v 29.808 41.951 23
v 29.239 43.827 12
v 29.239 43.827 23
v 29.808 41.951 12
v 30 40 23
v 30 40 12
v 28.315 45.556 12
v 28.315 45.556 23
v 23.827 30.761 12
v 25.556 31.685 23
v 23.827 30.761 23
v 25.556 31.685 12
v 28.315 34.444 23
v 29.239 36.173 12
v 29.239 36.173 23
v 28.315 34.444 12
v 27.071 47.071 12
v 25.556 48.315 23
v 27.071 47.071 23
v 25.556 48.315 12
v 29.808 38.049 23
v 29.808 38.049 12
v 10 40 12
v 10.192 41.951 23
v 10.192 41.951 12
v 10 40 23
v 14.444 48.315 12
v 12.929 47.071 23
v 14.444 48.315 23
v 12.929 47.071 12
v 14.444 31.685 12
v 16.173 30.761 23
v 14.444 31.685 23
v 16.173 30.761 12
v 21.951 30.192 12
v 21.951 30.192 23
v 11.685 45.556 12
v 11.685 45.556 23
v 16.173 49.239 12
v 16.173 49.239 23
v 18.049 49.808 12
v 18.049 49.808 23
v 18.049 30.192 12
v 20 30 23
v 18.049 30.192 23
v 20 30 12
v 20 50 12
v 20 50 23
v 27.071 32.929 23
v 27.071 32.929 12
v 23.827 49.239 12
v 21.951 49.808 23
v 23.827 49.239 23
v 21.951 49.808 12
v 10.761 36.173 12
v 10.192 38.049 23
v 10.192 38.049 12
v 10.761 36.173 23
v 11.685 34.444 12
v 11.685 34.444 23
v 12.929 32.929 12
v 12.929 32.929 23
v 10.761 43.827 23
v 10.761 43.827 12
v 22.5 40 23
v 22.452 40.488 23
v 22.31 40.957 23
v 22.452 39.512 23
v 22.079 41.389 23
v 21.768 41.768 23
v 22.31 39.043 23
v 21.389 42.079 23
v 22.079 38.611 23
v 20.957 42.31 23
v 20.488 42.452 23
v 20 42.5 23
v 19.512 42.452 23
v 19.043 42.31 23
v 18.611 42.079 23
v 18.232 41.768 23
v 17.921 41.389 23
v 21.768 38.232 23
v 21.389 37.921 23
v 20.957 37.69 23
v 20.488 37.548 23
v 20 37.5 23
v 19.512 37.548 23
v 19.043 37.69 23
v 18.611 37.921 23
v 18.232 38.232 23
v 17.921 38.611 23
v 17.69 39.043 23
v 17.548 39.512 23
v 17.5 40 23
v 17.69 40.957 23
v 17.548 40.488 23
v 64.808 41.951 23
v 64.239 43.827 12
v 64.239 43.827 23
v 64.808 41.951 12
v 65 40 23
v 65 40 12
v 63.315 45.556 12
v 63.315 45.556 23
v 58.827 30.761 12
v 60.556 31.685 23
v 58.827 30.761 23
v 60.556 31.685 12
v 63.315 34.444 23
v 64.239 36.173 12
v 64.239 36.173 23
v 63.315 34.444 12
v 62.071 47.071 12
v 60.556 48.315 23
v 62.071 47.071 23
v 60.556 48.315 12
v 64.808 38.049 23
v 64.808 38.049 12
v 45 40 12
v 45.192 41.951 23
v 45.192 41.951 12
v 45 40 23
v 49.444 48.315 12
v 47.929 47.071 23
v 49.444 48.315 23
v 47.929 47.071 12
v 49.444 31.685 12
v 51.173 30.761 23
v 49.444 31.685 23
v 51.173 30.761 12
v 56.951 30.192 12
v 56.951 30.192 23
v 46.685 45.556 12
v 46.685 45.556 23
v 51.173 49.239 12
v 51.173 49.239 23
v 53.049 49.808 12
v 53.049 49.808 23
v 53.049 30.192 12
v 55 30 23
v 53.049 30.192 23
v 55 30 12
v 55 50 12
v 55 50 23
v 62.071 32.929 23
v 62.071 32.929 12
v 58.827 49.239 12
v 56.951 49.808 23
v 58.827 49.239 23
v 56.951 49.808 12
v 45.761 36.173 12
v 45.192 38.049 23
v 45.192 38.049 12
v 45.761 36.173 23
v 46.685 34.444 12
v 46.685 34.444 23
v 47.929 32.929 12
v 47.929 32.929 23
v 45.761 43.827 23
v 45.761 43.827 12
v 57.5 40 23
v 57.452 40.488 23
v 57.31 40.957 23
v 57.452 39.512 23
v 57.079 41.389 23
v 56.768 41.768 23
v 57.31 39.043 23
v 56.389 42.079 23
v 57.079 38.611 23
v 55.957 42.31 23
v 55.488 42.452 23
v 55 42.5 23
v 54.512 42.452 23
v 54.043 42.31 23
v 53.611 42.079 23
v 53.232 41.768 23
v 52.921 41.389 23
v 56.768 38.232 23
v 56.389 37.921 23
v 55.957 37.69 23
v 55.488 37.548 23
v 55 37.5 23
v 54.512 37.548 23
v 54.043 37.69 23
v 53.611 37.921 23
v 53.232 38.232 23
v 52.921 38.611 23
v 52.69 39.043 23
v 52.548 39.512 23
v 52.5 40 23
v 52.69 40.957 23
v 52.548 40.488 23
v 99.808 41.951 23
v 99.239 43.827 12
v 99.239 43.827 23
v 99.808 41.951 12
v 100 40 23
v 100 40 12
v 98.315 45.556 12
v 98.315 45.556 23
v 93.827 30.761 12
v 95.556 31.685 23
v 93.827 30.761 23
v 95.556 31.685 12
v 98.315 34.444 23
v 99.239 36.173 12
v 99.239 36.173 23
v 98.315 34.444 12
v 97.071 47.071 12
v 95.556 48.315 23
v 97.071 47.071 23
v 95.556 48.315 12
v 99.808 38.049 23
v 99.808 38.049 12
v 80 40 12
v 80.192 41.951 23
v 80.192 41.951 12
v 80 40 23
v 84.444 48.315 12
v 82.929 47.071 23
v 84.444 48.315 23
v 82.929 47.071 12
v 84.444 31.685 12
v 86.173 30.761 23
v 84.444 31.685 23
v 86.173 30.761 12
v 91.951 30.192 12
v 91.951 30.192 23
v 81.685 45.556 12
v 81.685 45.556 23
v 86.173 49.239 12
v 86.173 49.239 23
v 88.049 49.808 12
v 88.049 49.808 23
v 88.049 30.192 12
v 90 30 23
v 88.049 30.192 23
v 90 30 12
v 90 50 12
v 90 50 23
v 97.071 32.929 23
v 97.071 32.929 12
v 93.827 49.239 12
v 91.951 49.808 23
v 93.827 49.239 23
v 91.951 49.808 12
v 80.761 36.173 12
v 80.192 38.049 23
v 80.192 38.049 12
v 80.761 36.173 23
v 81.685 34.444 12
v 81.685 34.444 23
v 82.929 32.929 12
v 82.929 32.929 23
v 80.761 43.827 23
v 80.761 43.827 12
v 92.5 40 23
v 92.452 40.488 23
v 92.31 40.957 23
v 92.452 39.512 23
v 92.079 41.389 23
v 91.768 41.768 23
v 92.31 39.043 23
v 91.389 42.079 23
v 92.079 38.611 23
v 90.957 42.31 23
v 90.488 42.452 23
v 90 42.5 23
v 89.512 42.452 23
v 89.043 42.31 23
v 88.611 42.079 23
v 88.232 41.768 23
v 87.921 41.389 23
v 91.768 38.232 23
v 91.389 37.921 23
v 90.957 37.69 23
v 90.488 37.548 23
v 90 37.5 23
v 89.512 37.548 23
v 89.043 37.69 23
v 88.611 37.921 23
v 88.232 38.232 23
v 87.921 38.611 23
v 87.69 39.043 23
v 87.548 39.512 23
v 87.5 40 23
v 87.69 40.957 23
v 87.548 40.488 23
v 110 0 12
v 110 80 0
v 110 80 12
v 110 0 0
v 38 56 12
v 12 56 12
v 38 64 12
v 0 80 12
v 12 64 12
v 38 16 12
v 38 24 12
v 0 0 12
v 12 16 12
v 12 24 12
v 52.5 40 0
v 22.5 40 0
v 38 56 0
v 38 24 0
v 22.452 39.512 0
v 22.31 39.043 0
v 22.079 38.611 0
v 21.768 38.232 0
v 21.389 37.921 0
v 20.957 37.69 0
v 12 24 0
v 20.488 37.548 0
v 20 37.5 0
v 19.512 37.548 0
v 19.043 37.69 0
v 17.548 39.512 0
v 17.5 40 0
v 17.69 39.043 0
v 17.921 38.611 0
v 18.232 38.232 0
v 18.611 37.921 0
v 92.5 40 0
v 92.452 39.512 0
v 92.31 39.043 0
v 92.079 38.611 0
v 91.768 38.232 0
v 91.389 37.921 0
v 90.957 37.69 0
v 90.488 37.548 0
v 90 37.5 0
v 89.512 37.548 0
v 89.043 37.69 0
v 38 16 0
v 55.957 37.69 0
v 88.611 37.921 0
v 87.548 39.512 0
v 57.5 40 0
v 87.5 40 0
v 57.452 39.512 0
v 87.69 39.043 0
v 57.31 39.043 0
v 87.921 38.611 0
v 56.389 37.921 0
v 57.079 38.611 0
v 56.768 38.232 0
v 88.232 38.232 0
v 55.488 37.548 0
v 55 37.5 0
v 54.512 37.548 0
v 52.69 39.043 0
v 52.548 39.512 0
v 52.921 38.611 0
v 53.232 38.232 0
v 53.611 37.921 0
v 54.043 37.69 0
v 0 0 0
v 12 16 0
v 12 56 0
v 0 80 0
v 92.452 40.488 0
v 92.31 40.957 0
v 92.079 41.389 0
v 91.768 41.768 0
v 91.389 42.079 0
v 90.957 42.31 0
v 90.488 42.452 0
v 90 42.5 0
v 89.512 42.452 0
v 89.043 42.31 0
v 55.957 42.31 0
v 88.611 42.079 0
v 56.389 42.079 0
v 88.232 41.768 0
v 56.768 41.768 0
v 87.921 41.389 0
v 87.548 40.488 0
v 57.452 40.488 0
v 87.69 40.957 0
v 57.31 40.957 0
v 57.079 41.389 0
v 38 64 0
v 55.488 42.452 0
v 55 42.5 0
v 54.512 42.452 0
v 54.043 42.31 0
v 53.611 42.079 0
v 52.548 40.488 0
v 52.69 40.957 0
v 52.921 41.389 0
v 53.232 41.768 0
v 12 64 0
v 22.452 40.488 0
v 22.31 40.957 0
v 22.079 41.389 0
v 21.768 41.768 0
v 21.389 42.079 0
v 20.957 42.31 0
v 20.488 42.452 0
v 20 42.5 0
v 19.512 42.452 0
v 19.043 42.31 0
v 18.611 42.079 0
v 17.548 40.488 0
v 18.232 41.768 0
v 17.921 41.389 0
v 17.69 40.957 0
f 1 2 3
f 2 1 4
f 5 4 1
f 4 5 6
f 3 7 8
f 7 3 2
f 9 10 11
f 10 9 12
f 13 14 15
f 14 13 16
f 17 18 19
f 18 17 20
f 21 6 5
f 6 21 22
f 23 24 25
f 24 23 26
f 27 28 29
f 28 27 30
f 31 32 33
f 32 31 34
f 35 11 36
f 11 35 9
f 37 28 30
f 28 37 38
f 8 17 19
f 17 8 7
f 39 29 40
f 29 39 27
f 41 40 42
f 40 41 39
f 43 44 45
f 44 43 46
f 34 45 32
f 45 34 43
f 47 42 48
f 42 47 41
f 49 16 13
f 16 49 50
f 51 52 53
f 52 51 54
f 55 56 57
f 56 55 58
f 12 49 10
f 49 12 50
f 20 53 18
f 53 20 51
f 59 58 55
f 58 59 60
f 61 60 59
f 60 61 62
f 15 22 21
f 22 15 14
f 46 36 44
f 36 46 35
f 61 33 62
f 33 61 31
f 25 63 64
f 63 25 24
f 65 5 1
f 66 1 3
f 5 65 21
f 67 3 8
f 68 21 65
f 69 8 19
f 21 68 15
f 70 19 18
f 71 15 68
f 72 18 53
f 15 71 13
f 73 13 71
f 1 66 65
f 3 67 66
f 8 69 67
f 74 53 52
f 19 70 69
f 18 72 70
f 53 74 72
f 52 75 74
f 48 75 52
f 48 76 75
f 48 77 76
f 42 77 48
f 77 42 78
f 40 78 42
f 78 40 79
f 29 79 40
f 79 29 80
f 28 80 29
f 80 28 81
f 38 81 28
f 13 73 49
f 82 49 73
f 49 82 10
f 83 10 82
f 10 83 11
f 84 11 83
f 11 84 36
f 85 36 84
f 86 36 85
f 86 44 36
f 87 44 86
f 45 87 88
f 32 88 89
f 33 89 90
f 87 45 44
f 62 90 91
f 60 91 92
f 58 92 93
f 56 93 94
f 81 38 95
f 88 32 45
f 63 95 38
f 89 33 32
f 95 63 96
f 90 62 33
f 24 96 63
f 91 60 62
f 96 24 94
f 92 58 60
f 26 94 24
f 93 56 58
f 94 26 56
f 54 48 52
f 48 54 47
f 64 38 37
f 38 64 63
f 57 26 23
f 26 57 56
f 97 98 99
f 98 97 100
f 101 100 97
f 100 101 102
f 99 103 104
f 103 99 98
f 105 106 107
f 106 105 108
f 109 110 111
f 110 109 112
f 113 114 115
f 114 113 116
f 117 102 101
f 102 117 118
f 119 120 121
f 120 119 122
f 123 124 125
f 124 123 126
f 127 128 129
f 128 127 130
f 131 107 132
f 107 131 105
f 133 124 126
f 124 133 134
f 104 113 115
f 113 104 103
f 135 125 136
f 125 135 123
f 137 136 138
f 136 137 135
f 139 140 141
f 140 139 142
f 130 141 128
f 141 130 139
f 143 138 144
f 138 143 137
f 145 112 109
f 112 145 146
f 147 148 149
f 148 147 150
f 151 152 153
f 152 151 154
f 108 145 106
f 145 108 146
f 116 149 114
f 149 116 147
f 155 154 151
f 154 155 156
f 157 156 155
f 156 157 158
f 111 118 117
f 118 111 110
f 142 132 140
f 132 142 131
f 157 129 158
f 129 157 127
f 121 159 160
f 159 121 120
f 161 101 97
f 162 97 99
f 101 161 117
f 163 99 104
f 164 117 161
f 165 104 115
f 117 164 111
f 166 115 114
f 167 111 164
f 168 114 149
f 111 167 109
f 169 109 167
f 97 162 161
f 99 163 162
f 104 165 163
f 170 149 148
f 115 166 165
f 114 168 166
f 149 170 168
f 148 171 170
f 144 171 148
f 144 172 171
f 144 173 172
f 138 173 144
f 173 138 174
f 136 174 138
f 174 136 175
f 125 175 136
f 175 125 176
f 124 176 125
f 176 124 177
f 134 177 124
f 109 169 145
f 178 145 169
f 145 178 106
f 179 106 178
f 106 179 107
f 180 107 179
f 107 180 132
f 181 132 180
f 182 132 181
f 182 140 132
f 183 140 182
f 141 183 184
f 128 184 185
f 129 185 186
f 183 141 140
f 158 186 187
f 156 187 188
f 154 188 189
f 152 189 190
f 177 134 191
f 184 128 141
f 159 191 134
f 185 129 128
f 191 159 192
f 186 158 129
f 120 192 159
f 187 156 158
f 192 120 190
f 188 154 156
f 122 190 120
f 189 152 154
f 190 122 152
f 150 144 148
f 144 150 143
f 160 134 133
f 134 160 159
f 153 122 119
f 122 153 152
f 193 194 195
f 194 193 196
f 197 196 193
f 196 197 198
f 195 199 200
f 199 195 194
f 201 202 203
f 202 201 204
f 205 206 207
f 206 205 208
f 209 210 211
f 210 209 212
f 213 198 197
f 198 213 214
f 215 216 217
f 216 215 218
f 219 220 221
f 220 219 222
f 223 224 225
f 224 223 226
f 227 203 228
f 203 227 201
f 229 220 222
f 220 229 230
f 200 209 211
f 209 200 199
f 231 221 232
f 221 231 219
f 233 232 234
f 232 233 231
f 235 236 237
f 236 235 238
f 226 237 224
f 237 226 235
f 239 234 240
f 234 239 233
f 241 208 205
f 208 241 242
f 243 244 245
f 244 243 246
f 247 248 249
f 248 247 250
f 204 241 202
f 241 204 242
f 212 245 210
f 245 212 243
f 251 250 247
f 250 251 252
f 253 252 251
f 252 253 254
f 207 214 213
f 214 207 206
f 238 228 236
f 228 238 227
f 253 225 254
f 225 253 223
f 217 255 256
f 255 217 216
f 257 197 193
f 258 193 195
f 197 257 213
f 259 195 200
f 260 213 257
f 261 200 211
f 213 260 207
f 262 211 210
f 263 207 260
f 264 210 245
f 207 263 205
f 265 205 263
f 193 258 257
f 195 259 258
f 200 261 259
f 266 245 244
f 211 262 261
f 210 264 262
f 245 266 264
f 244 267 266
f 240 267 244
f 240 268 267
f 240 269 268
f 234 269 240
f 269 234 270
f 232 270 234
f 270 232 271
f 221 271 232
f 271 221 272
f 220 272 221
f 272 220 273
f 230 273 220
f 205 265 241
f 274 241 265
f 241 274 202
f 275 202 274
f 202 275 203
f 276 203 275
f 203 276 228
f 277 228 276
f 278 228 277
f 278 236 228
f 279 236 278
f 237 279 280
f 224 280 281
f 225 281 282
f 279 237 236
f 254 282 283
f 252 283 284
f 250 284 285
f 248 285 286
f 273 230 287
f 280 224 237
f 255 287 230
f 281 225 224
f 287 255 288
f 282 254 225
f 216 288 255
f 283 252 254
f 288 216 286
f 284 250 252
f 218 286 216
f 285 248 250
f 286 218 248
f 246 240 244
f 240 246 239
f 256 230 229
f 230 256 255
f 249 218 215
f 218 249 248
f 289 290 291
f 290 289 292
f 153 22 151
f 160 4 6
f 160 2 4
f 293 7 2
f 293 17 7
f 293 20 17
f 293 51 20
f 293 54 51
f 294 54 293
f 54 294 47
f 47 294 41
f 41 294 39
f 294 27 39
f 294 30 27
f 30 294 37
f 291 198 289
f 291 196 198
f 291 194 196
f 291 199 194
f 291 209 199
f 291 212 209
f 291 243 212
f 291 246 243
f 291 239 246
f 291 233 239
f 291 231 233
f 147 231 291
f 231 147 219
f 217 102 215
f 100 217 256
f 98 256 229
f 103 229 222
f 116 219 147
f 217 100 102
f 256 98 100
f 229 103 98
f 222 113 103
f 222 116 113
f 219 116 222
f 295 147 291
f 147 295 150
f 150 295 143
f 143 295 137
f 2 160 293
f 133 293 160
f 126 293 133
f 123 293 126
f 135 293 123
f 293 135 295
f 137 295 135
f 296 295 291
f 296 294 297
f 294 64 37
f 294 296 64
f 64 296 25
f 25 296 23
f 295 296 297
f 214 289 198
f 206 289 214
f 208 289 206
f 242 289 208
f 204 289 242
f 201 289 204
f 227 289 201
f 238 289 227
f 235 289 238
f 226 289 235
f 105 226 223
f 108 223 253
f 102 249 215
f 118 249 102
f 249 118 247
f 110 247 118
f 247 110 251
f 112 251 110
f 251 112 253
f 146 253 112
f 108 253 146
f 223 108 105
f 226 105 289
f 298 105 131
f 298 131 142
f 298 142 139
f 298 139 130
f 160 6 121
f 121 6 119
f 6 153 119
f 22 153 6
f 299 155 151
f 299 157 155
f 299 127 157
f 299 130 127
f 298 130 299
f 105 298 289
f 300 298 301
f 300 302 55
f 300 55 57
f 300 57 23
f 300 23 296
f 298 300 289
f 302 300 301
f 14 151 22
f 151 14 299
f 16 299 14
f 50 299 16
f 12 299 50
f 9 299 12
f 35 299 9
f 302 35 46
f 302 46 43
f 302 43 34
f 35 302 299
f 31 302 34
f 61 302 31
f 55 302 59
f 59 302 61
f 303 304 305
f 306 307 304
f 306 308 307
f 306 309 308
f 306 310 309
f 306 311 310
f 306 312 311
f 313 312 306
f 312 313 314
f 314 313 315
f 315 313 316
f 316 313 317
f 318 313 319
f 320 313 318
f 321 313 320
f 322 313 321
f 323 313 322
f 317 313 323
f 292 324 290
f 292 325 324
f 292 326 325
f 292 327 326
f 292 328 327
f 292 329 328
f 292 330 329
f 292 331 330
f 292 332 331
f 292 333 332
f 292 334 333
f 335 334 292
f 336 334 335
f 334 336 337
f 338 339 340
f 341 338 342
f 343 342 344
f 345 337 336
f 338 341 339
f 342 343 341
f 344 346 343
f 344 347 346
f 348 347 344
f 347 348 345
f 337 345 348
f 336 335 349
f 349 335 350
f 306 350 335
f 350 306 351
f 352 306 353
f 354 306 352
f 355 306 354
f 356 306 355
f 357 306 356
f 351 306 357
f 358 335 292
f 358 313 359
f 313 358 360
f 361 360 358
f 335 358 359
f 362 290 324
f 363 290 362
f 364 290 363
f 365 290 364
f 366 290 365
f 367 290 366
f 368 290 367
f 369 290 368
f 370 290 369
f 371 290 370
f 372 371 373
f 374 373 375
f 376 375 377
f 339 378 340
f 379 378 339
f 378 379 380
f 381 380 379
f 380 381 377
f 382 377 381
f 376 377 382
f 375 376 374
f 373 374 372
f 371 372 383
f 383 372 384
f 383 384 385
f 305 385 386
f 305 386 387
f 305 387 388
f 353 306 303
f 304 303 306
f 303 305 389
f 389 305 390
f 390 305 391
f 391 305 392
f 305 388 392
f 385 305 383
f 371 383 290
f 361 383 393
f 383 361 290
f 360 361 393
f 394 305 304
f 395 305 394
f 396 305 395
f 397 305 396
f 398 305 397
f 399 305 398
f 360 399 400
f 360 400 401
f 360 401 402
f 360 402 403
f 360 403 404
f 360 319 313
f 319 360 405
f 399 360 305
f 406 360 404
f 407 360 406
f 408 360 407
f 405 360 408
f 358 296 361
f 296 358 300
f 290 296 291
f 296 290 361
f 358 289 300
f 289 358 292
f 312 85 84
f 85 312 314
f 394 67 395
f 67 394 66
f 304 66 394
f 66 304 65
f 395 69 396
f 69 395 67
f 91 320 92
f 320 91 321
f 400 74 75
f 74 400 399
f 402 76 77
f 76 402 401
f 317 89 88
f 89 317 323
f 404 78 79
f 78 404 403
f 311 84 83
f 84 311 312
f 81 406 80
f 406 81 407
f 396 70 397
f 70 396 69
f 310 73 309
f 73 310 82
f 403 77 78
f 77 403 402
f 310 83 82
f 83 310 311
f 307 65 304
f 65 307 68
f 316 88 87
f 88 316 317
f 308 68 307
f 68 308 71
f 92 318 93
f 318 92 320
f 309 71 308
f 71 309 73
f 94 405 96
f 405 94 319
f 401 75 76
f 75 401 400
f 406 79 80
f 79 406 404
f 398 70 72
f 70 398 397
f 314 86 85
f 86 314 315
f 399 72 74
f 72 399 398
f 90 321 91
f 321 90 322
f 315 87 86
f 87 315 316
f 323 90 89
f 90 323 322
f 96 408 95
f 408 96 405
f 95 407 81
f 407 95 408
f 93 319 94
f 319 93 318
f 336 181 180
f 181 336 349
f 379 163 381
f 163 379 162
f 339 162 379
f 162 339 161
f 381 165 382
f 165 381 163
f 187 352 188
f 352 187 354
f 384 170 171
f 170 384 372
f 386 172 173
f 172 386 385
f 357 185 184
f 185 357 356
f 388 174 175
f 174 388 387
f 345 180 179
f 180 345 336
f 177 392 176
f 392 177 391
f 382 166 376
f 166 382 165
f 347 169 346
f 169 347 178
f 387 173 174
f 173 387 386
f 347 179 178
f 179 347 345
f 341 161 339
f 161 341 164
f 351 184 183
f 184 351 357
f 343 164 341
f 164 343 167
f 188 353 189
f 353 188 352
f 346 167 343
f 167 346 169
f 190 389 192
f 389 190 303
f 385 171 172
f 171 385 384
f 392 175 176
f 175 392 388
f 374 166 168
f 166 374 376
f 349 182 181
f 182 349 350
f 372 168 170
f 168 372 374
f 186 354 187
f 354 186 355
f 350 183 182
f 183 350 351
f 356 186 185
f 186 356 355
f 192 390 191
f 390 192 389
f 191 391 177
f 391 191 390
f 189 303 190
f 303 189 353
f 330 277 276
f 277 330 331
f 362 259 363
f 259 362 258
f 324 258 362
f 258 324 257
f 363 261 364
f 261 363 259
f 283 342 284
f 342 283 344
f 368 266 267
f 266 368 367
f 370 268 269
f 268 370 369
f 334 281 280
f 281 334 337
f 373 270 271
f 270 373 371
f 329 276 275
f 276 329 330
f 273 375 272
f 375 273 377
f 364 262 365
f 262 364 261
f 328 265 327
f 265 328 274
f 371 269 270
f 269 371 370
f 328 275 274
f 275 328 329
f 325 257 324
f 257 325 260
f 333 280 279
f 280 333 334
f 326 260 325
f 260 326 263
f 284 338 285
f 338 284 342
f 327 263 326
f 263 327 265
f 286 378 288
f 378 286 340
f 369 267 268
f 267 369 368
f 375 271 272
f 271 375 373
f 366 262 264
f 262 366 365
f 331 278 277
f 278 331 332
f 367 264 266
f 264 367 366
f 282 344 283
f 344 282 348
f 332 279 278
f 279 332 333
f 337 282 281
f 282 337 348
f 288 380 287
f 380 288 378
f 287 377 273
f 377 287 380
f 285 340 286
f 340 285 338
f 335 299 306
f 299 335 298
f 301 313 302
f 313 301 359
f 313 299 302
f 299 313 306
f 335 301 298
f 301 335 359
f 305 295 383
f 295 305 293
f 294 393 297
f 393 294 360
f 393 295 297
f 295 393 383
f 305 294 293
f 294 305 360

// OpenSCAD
$fn = 32;

// ----------------------------------------------------------------------
// Drill jig: three_boss_slot jig
// ----------------------------------------------------------------------

// --- parameters (mm) ---
plate_l = 110;            // plate length, X
plate_w = 80;             // plate width, Y
plate_t = 12;             // plate thickness
boss_d = 20;              // guide boss diameter
boss_h = 12;              // boss height above the plate
guide_d = 5;              // guide hole diameter
boss_pitch = 35;          // boss pitch
slot_w = 8;               // clamp slot width
slot_l = 26;              // clamp slot length
slot_x = 12;              // slot start X

n_boss = 3;  // guide bosses
boss_x0 = (plate_l - (n_boss - 1) * boss_pitch) / 2;  // first boss X
boss_top = plate_t - 1 + boss_h;  // boss crown height
total_h = boss_top;  // overall height

difference() {
  union() {
  cube([plate_l, plate_w, plate_t]);
  for (i = [0 : n_boss - 1])
    translate([boss_x0 + i * boss_pitch, plate_w / 2, plate_t - 1])
      cylinder(h = boss_h, d = boss_d);
  }
  for (i = [0 : n_boss - 1])
    translate([boss_x0 + i * boss_pitch, plate_w / 2, -1])
      cylinder(h = plate_t + boss_h, d = guide_d);
  for (cy = [plate_w * 0.25, plate_w * 0.75])
    translate([slot_x, cy - slot_w / 2, -1])
      cube([slot_l, slot_w, plate_t + 2]);
}
